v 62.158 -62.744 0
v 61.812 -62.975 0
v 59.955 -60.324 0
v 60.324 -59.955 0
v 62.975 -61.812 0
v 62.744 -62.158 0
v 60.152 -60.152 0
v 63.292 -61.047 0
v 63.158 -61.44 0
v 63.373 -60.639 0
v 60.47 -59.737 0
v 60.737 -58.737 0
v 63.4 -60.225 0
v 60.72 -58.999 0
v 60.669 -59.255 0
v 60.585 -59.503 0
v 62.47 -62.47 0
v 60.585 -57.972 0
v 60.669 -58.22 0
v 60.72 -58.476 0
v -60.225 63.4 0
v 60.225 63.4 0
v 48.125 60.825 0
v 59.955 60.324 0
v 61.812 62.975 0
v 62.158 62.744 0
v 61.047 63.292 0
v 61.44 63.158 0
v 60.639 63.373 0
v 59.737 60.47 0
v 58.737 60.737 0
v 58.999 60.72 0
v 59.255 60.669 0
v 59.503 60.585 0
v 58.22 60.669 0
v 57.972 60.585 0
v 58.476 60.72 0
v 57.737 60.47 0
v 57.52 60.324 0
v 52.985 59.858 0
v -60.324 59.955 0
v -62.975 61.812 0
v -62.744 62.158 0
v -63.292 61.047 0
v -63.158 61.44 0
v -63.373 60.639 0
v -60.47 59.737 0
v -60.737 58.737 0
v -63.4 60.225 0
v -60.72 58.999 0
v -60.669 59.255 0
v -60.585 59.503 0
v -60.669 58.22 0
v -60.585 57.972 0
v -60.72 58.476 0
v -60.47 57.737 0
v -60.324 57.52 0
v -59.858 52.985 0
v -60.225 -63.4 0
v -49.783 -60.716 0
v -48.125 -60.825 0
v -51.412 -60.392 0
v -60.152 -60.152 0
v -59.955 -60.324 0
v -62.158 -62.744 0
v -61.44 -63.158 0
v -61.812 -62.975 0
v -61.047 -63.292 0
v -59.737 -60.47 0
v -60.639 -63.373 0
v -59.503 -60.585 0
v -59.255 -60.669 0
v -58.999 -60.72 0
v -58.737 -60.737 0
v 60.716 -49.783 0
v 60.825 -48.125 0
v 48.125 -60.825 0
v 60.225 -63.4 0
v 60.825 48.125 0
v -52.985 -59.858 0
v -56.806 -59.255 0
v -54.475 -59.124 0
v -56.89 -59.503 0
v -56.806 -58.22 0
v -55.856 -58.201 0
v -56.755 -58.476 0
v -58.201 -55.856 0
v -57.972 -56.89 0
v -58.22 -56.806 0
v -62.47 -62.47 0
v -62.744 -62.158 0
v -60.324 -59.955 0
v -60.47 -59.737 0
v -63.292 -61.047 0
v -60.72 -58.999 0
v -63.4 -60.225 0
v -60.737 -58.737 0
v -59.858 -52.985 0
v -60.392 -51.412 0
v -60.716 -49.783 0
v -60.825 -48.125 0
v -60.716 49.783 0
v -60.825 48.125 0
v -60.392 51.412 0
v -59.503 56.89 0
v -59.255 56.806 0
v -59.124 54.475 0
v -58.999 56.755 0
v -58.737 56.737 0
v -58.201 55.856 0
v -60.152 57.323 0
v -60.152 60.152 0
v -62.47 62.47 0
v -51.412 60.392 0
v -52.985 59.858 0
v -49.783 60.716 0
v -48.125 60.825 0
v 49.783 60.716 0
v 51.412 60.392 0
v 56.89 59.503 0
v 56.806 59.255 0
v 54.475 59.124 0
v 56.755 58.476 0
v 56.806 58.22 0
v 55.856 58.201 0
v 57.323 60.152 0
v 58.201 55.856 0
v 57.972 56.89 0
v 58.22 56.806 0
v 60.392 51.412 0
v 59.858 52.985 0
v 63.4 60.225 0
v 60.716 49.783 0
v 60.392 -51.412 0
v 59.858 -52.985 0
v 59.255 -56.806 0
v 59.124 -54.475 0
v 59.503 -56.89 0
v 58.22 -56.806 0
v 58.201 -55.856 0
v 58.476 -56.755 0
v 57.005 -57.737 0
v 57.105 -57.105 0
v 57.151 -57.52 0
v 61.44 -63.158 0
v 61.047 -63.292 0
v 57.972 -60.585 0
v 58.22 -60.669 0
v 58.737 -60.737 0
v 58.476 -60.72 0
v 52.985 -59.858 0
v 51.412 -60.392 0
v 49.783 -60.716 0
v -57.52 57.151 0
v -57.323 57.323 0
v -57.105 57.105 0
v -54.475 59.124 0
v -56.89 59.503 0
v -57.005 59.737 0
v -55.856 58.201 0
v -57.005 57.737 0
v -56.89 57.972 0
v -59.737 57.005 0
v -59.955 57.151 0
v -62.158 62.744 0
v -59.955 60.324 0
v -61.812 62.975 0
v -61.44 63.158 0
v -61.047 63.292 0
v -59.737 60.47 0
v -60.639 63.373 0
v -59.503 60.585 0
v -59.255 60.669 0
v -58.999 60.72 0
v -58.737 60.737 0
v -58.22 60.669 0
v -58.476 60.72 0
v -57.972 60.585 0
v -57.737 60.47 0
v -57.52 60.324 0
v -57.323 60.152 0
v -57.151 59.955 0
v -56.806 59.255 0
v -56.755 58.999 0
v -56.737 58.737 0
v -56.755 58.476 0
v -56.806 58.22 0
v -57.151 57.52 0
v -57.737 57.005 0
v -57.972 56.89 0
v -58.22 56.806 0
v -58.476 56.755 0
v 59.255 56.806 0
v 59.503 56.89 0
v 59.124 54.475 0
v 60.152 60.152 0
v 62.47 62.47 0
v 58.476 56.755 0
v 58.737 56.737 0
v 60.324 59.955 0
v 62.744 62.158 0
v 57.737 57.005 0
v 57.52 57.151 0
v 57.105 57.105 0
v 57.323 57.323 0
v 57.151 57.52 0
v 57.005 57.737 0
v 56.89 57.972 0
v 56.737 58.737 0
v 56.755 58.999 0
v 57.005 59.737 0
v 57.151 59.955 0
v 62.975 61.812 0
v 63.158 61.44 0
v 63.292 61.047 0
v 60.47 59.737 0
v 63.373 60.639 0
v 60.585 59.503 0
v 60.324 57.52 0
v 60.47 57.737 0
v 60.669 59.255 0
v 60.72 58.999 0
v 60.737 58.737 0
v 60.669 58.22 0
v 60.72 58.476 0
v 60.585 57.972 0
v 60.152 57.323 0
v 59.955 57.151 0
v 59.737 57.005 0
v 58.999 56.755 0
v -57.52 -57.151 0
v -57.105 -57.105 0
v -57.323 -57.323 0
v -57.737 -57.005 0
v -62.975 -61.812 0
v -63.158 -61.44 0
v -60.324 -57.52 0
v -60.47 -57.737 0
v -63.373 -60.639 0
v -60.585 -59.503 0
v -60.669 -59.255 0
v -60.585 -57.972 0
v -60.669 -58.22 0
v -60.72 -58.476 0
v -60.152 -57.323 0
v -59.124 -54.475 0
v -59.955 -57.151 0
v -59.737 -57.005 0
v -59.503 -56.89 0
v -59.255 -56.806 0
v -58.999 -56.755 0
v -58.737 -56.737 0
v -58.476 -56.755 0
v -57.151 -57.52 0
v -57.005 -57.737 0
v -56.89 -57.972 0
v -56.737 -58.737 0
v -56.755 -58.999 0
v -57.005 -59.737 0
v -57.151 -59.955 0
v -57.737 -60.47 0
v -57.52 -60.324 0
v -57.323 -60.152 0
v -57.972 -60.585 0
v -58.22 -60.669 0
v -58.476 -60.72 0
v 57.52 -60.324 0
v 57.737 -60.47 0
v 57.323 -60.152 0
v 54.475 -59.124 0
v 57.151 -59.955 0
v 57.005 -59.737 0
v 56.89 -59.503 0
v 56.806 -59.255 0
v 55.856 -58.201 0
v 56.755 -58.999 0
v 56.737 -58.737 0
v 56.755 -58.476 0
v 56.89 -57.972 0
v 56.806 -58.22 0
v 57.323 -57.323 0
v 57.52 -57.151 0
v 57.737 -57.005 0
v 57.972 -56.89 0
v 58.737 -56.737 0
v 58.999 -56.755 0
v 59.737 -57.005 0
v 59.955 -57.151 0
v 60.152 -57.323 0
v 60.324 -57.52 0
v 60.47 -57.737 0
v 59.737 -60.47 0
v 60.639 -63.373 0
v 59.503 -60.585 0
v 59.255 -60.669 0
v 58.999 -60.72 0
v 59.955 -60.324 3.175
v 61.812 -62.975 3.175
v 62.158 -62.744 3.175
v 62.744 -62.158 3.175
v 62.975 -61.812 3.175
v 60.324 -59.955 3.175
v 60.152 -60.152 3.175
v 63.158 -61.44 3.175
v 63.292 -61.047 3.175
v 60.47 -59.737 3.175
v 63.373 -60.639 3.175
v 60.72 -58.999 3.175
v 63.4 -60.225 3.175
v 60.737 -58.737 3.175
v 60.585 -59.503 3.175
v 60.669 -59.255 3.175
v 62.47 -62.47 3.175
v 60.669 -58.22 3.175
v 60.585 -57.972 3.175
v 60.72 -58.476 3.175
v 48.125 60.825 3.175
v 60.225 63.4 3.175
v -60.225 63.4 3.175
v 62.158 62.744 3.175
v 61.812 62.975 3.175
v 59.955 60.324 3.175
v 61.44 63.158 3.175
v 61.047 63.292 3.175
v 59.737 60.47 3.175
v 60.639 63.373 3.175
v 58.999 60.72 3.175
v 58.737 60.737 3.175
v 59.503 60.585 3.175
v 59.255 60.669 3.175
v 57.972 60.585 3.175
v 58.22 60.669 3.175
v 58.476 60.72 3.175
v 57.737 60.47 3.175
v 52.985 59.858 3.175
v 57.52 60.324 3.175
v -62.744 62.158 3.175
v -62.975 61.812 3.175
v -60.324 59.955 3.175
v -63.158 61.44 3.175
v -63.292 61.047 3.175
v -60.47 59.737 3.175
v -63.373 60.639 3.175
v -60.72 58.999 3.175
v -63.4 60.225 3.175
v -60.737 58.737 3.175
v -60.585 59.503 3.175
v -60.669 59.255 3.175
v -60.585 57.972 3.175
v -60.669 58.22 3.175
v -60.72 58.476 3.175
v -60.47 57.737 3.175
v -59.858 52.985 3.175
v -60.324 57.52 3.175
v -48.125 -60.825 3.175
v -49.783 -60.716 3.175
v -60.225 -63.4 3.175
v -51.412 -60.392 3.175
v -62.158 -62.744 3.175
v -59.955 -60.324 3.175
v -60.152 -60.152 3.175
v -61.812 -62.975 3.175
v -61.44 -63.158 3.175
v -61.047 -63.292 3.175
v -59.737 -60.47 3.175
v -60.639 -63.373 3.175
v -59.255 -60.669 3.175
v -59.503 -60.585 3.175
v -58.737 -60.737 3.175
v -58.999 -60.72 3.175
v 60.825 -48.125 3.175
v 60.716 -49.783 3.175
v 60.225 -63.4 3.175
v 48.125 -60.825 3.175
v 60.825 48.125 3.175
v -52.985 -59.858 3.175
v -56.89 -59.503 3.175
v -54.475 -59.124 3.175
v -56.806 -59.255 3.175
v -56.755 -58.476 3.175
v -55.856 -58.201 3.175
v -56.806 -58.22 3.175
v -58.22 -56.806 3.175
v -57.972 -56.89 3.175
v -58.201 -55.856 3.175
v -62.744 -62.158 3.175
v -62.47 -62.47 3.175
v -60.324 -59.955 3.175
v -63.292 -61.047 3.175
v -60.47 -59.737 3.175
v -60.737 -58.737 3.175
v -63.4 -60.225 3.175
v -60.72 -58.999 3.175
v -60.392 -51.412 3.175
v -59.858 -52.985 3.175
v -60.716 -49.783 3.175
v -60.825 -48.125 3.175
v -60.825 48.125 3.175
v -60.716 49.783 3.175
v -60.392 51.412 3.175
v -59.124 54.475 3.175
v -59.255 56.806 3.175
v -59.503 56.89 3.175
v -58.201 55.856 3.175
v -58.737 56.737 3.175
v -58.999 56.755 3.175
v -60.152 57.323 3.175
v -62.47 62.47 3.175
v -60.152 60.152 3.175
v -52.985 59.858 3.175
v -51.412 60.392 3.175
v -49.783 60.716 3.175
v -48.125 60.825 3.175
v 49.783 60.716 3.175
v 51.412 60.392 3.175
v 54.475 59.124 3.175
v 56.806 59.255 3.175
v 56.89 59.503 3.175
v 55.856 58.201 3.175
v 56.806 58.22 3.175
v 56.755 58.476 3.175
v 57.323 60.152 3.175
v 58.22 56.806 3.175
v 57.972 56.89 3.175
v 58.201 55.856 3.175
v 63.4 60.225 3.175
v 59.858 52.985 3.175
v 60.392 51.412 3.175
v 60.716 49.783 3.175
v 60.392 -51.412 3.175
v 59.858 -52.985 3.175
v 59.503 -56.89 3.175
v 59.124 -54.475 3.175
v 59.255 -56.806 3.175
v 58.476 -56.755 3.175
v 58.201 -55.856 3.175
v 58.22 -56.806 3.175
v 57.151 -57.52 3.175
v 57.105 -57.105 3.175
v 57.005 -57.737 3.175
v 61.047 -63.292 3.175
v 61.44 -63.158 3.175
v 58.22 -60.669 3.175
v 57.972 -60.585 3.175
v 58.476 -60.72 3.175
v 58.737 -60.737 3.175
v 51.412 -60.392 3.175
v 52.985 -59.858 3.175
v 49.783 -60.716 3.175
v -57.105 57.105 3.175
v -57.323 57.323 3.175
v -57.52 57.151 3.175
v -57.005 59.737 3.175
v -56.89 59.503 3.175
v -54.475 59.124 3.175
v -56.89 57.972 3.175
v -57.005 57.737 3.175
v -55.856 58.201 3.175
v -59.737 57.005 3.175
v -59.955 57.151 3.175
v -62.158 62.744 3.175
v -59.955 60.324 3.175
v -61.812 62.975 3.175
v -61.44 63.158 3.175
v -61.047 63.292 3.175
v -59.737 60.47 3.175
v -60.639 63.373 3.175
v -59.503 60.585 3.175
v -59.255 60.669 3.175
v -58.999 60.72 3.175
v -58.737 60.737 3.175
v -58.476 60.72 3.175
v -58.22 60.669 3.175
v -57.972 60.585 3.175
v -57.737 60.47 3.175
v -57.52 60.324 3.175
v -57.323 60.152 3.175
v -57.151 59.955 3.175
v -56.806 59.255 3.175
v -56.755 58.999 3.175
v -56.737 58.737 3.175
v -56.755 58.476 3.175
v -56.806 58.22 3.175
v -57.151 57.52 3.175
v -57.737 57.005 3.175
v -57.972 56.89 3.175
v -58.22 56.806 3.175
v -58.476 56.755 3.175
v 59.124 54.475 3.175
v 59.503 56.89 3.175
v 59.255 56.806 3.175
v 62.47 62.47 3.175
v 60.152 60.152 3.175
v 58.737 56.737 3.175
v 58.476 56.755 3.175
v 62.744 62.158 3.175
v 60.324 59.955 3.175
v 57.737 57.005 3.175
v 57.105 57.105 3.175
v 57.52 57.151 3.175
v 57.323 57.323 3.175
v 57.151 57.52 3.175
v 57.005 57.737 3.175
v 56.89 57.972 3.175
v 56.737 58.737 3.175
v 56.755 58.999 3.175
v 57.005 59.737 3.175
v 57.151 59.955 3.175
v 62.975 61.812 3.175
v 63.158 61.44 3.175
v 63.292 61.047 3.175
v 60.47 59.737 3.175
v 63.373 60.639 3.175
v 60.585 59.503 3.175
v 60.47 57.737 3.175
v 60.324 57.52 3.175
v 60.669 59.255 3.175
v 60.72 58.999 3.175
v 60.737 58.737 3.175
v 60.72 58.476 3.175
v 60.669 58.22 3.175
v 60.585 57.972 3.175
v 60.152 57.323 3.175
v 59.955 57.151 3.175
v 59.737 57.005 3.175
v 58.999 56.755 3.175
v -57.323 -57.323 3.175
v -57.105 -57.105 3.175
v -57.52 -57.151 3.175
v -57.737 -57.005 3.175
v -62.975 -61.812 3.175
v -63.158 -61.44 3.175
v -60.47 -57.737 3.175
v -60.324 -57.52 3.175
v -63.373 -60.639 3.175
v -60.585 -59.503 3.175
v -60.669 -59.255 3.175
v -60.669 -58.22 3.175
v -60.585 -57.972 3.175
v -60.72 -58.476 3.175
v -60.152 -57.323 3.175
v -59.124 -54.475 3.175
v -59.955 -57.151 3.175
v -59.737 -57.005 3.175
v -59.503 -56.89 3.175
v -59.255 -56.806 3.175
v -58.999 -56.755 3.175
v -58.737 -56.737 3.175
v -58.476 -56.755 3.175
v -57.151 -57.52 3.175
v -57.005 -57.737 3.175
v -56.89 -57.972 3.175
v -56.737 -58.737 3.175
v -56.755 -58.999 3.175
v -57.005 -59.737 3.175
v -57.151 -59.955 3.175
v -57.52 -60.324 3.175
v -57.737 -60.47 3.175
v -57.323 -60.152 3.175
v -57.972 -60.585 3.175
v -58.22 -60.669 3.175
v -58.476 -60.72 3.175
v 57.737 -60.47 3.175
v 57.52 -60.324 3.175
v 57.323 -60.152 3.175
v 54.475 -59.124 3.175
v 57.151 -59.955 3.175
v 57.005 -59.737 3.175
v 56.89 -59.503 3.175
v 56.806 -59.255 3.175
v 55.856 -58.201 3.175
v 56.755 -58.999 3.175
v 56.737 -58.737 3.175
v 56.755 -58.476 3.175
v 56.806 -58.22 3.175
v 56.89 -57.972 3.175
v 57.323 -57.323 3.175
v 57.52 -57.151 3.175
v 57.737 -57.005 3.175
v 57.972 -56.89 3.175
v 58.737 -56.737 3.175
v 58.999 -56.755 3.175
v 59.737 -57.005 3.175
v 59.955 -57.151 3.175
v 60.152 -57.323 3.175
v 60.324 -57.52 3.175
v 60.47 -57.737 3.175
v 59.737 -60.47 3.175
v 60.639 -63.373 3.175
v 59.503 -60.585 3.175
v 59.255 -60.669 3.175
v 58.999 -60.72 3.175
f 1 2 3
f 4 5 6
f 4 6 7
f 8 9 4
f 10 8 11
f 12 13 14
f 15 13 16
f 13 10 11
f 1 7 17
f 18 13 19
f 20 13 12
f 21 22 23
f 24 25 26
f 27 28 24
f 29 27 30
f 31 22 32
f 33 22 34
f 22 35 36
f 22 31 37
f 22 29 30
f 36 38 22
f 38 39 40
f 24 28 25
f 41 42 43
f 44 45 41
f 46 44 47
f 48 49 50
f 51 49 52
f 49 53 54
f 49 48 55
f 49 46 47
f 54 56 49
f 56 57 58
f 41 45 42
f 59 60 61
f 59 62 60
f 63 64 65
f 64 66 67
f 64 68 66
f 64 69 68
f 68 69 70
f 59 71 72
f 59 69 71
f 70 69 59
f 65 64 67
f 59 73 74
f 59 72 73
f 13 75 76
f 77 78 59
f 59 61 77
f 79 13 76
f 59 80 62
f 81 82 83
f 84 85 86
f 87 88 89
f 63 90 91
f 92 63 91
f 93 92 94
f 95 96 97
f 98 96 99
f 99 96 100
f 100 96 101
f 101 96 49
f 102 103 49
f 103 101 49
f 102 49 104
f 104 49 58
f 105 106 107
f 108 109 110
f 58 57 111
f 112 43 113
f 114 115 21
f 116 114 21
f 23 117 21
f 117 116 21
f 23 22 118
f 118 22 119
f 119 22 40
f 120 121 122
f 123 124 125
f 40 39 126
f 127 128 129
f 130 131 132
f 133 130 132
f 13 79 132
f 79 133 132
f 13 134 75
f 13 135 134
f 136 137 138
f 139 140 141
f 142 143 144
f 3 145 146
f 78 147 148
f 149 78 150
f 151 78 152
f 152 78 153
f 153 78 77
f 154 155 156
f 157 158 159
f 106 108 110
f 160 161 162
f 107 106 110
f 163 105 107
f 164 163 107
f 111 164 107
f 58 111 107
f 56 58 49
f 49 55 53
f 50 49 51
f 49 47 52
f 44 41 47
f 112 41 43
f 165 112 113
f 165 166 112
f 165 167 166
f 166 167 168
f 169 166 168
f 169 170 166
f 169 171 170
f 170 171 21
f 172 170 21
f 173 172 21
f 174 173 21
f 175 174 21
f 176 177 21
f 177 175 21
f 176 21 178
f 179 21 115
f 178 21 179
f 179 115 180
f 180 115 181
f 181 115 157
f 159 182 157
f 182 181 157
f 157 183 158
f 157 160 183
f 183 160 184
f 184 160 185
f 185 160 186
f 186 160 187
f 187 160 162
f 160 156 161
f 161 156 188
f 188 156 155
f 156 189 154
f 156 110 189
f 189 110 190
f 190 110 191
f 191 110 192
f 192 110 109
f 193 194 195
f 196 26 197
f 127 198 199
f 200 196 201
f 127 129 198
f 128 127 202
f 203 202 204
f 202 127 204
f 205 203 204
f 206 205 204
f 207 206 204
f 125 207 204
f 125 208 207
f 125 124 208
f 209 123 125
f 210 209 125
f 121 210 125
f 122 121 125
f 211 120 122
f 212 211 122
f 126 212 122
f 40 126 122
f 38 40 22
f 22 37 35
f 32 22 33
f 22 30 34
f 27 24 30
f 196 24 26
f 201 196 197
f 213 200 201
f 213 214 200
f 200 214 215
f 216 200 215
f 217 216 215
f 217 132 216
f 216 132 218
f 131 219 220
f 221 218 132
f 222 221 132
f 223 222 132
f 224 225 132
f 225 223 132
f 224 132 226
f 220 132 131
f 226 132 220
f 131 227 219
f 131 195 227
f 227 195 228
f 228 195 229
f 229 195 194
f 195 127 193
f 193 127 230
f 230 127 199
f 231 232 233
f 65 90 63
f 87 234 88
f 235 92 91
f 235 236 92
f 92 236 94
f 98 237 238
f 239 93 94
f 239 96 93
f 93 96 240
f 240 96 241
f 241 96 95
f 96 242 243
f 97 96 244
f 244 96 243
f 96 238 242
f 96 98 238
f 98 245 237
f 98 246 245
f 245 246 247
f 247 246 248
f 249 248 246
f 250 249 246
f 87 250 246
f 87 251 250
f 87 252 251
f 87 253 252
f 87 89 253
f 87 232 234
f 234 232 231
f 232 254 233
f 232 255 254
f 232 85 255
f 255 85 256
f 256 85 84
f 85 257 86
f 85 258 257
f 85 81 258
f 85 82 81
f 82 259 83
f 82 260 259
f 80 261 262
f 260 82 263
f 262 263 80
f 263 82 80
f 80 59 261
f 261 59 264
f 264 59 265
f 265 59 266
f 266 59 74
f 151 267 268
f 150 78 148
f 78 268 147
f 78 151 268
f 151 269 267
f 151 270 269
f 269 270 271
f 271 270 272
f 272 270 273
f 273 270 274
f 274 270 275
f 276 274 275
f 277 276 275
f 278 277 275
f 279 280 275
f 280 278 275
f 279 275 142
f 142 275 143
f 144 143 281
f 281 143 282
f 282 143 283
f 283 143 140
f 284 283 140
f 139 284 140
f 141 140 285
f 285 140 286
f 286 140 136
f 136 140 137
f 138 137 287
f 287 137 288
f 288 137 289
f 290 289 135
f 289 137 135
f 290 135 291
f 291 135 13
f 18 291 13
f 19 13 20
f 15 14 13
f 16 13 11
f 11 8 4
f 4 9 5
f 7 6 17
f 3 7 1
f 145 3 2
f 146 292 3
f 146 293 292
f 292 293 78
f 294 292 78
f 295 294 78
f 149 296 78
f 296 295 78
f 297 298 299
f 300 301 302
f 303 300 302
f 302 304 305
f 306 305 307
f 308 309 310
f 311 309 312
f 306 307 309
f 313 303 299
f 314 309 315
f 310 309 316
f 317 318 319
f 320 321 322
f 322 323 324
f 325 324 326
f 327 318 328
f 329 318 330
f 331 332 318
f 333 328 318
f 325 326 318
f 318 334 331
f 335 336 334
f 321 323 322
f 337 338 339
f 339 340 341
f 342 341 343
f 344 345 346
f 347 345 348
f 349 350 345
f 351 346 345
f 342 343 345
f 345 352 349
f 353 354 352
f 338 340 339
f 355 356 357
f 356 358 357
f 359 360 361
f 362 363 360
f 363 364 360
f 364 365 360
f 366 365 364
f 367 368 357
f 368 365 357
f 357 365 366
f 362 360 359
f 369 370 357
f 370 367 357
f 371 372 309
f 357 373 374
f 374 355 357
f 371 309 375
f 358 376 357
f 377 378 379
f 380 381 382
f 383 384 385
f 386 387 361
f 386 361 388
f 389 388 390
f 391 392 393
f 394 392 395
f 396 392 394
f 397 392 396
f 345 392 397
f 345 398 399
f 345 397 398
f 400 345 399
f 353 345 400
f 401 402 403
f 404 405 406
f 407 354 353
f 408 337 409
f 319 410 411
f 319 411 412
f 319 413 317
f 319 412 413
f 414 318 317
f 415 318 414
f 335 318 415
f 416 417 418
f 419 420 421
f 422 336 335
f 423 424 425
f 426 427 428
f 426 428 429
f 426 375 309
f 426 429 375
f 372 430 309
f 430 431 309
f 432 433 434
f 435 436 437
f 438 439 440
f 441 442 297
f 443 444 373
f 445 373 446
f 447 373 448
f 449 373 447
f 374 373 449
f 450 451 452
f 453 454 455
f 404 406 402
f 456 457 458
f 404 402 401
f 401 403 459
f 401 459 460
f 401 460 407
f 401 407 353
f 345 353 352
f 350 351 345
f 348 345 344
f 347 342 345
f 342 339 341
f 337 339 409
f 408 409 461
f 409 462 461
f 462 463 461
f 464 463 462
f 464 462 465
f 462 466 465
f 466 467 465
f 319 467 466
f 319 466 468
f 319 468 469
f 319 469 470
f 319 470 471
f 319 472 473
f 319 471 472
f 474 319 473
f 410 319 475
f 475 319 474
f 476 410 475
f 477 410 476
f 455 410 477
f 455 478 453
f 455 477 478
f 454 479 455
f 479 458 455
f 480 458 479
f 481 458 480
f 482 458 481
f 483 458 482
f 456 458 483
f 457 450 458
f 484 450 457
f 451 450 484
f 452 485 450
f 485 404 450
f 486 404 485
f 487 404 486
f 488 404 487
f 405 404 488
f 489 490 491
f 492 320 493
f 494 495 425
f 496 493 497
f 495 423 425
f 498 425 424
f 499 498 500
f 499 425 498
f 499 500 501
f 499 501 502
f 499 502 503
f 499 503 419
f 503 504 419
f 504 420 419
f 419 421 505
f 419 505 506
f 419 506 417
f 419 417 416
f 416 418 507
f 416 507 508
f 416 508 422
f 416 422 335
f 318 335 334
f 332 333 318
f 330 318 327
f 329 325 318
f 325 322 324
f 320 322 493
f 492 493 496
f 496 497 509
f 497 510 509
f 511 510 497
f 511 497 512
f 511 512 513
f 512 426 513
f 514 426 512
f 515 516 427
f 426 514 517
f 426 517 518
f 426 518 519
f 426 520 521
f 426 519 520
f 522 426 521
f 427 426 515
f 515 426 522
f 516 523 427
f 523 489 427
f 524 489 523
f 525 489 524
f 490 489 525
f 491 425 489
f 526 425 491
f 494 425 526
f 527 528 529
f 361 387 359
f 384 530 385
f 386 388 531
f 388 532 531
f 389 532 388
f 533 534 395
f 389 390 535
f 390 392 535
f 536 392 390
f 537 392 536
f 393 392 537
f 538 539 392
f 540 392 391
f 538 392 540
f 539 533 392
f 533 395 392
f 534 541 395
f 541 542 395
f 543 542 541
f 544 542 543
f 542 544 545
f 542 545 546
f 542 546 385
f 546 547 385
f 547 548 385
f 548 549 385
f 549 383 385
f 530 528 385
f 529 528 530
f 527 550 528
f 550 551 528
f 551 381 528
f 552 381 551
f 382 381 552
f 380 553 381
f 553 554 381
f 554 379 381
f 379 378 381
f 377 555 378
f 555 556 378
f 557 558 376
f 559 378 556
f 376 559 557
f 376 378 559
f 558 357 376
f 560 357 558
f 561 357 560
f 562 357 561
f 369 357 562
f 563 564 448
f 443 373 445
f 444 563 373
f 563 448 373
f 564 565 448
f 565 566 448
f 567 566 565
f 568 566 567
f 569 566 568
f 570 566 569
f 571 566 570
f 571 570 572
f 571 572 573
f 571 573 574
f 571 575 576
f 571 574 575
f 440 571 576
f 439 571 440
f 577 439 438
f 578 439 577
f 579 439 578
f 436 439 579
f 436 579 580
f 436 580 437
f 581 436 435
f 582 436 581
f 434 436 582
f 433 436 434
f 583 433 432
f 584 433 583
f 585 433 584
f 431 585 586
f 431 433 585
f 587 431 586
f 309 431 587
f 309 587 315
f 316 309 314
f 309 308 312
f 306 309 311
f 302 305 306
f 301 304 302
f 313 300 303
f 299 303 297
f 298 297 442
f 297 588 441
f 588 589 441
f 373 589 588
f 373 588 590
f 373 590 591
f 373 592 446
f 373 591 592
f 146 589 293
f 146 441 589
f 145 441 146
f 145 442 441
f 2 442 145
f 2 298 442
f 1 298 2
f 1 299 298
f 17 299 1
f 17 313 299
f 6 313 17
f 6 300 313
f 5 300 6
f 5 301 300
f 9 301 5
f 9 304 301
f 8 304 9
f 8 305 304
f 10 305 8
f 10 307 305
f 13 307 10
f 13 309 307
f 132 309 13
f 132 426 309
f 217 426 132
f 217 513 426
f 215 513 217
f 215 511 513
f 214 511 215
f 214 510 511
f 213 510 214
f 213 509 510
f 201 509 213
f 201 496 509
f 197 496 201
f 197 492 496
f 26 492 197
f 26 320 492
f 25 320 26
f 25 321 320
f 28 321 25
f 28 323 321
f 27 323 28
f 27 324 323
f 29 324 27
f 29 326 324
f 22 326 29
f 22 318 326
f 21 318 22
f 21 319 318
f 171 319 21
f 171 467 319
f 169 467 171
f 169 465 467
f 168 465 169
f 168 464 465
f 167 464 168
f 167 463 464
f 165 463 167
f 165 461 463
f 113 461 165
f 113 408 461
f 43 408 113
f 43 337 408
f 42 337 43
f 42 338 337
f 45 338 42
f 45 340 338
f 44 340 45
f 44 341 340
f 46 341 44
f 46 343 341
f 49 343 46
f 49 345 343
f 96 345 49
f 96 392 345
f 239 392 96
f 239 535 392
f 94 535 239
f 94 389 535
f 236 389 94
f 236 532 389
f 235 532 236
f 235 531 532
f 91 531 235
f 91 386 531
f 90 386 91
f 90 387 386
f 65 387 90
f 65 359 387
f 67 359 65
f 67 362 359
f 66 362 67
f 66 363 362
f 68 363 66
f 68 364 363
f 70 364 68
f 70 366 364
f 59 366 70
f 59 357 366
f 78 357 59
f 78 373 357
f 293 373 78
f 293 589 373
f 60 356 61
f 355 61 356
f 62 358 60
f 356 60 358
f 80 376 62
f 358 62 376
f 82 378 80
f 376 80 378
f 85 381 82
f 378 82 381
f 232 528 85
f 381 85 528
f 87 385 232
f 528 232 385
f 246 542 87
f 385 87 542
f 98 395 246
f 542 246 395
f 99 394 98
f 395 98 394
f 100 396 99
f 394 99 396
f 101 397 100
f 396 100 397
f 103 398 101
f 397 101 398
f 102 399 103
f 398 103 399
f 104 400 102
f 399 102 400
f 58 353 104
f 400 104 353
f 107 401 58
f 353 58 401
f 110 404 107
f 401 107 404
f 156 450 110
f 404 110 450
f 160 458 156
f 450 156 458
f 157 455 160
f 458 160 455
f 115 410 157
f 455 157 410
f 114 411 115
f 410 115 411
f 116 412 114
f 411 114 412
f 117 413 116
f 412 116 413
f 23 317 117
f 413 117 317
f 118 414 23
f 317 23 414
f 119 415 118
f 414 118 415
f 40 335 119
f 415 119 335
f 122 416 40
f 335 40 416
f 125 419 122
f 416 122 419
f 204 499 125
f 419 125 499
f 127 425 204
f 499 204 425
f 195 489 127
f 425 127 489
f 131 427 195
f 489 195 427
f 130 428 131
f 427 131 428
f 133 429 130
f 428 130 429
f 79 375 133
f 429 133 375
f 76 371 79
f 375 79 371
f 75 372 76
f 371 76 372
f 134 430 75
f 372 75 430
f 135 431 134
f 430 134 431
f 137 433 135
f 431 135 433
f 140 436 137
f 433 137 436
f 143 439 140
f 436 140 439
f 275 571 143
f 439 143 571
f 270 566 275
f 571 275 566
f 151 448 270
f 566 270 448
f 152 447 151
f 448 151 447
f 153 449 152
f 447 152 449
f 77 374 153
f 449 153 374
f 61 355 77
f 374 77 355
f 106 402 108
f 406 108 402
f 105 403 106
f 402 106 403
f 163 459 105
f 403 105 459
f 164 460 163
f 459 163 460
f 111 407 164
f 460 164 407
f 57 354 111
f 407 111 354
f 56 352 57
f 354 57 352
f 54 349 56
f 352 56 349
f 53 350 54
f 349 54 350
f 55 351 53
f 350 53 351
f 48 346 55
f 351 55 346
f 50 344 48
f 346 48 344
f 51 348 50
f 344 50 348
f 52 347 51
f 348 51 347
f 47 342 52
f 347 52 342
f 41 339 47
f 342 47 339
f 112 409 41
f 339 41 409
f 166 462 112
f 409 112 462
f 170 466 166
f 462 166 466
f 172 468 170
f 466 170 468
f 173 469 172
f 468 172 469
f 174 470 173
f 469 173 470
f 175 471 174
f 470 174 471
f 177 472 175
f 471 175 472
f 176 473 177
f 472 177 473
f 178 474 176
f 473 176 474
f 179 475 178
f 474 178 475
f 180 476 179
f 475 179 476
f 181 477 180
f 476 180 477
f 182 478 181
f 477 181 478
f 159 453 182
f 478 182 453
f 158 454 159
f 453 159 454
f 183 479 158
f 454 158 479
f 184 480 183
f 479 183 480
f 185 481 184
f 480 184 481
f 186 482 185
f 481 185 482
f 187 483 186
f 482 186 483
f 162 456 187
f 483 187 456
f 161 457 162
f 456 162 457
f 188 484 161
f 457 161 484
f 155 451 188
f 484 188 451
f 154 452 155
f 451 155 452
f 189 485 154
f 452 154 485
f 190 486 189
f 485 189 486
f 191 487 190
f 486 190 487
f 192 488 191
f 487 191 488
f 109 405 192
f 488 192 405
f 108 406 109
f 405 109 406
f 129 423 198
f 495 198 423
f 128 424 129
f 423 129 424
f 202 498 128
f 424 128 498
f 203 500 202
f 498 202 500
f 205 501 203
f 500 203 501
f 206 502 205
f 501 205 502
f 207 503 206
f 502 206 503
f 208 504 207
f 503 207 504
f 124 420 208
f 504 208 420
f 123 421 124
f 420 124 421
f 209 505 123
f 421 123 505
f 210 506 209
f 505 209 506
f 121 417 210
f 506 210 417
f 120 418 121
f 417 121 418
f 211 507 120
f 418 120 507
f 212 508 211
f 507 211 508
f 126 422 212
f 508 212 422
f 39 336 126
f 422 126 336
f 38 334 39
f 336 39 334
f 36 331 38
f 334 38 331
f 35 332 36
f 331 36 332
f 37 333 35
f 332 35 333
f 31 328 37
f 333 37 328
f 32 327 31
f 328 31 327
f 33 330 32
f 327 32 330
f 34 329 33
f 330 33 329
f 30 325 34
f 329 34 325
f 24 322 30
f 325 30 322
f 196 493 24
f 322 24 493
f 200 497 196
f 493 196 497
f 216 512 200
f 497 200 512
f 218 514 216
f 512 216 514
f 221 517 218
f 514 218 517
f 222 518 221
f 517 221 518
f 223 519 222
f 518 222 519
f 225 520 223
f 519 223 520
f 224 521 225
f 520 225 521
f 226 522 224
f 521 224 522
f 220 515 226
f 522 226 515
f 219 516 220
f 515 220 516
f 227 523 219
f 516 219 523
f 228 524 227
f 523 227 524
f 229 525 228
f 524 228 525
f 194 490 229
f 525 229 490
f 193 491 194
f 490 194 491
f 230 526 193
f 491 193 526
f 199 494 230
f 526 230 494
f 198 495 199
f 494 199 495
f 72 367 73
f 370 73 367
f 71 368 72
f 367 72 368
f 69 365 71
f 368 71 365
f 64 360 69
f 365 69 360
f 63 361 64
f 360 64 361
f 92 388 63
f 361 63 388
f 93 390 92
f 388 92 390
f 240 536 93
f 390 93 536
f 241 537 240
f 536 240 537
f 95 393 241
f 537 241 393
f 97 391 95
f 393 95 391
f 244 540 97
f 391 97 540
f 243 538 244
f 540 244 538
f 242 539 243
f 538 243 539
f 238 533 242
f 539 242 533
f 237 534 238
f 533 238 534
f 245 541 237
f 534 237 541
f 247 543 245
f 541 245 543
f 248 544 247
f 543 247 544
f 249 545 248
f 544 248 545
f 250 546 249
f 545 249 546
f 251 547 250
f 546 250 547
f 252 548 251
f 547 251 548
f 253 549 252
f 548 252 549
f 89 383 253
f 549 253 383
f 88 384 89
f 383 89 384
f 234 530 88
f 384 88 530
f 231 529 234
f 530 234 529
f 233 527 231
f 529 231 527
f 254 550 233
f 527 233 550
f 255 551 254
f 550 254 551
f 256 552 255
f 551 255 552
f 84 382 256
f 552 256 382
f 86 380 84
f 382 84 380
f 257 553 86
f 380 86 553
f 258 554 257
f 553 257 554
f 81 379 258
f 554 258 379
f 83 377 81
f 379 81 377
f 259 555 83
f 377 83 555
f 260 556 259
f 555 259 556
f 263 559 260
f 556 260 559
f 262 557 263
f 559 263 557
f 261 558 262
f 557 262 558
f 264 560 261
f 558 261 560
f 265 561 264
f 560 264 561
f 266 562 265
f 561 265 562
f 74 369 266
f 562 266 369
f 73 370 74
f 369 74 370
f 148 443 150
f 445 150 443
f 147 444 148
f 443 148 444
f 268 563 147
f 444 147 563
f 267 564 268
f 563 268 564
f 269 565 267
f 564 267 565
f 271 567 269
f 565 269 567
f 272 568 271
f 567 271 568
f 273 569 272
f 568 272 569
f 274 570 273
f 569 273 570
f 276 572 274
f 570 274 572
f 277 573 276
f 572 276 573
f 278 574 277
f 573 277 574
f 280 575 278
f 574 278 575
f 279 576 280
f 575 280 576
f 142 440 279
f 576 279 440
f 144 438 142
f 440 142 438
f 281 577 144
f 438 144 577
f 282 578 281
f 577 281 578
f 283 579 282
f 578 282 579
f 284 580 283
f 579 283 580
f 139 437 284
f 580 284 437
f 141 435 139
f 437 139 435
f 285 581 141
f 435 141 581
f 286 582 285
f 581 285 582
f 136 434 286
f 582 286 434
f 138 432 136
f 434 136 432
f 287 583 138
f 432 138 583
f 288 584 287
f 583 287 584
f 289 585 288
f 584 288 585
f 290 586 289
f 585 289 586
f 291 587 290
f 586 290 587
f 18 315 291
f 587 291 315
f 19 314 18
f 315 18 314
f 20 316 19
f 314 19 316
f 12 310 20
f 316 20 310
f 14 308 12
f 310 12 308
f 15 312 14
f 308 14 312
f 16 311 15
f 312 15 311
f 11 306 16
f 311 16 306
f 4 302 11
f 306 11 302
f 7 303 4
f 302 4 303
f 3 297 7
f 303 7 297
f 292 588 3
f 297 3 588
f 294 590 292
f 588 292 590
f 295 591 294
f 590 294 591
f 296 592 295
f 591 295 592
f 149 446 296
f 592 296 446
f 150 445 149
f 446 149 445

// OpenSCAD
// file: ../../lib/TOGArrayLib1.scad
// TOGArrayLib1.4
// 
// Functions for working with arrays.
// 
// v1.1:
// - tal1_reduce assert(is_list(items)) to prevent infinite recursion
//   when given undefined or other non-list values
// v1.1.1:
// - Fix tal1_uniq_remap_v2 to return "list-remap-result" as the
//   first element of the returned list
// v1.2:
// - Add tal1_replace_at function
// v1.3:
// - tal1_is_vec_of, tal1_is_vec_of_num
// v1.4:
// - tal1_assert_for_each, for when you want to assert something
//   about each of a list of items and get nice failure messages

/**
 * Make a list with the contents of list `a`,
 * but starting at offset `off`, replaced by the contents of list `b`.
 * len(result) = max(len(a), off+len(b))
 */
function tal1_replace_at(a, off, b, default_value=undef, default_value_function=undef) =
	assert(is_list(a))
	assert(is_list(b))
	let( _dvf = !is_undef(default_value_function) ? default_value_function : function(i) default_value )
[
	for( i=[0:1:min(off,len(a))-1] ) a[i],
	for( i=[len(a):1:off-1] ) _dvf(i),
	for( i=[off:1:off+len(b)-1] ) b[i-off],
	for( i=[off+len(b):1:len(a)-1] ) a[i],
];

// Simplest case
assert([] == tal1_replace_at([], 0, []));
// Second simplest cases
assert(["foo"] == tal1_replace_at(["foo"], 0, []));
assert(["foo"] == tal1_replace_at([], 0, ["foo"]));
// Replace one item
assert(["foo","quux","baz"] == tal1_replace_at(["foo","bar","baz"], 1, ["quux"]));
// Replace and extend
assert(["foo","quux","tuna","tina"] == tal1_replace_at(["foo","bar","baz"], 1, ["quux", "tuna", "tina"]));
// Add beyond end of `a`
assert(["foo","zzz","quux"] == tal1_replace_at(["foo"], 2, ["quux"], default_value="zzz"));
// Adding 'nothing' should still fill to that point with defaults
assert(["foo","zzz","zzz"] == tal1_replace_at(["foo"], 3, [], default_value="zzz"));


function tal1_reduce(start, items, func, offset=0) =
	assert(is_list(items))
	len(items) == offset ? start :
	tal1_reduce(func(start, items[offset]), items, func, offset+1);

function tal1_consecutive_duplicate_count(items) = tal1_reduce(
	[0, undef],
	items,
	function(z,item) [z[0] + (item == z[1] ? 1 : 0), item]
)[0];

assert(0 == tal1_consecutive_duplicate_count([]));
assert(0 == tal1_consecutive_duplicate_count([50]));
assert(1 == tal1_consecutive_duplicate_count([50,50]));
assert(0 == tal1_consecutive_duplicate_count([50,51,52,53]));
assert(1 == tal1_consecutive_duplicate_count([50,51,52,52]));
assert(3 == tal1_consecutive_duplicate_count([50,50,50,50]));

// Set test_size to arbirarily large values
// to ensure that OpenSCAD can handle heavy recursion
let(test_size=1000) assert(test_size/2 == tal1_consecutive_duplicate_count([for(i=[0:1:test_size-1]) floor(i/2)]));



function tal1_uniq_(items, off0, off1) =
	let(chunklen = off1-off0)
	chunklen == 0 ? [] :
	chunklen == 1 ? [items[off0]] :
	let(half=floor(chunklen/2))
	let(left  = tal1_uniq_(items, off0     , off0+half))
	let(right = tal1_uniq_(items, off0+half, off1     ))
	assert(len(left) > 0)
	assert(len(right) > 0)
	left[len(left)-1] == right[0] ? [each left, for(i=[1:1:len(right)-1]) right[i]] :
	[each left, each right];

/** Given a list of items, returns a new list with identical consecutive items merged */
function tal1_uniq(items) = tal1_uniq_(items, 0, len(items));

assert([] == tal1_uniq([]));
assert([123] == tal1_uniq([123]));
assert([55,0,1,2,3] == tal1_uniq([55,0,1,2,3]));
assert([55,0,1,2] == tal1_uniq([55,0,1,1,2]));
assert([55,0,1] == tal1_uniq([55,55,0,0,0,0,0,0,1,1,1,1]));
assert([55,0] == tal1_uniq([55,0,0,0,0,0,0,0]));



/**
 * Returns [new items, old index -> new index mapping].
 * No-op version.
 */
function tal1_uniq_remap_v1(items) =
	["list-remap-result", items, [for (vi=[0:1:len(items)-1]) vi]];

// [a, a, b, b, c, c]
//
// [a,    ...], []  -> [a],[0]
// [a, a, ...], [0] -> [a],[0,0]

assert([1,2,3] == [1,2,3]);

/**
 * Recursive version that will combine adjacent identical vertexes,
 * but will use the original items.
 */
function tal1_uniq_remap_v2(items, map=[]) =
	let(index = len(map))
	len(items) == index ? ["list-remap-result", items, map] :
	index == 0 ? tal1_uniq_remap_v2(items, [0]) :
	items[index] == items[map[index-1]] ? tal1_uniq_remap_v2(items, [for(vi=map) vi, map[index-1]]) :
	tal1_uniq_remap_v2(items, [for(vi=map) vi, index]);

assert(tal1_uniq_remap_v2([1,1,2,2,3,4]) == ["list-remap-result", [1,1,2,2,3,4], [0,0,2,2,4,5]]);


/**
 * Returns true if `vec` is a list of at least min_len items
 * and component_check(each item, even those beyond min_len) is true.
 */
function tal1_is_vec_of(vec, min_len=0, component_check=function(x) true) =
	assert(is_num(min_len) && min_len >= 0)
	assert(is_function(component_check))
	is_list(vec) && len(vec) >= min_len &&
	tal1_reduce(true, vec, function(prev,item) prev && component_check(item));

function tal1_is_vec_of_num(vec, min_len=0) = tal1_is_vec_of(vec, min_len, function(i) is_num(i));

assert( true == tal1_is_vec_of_num([1,2,3]));
assert( true == tal1_is_vec_of_num([]));
assert( true == tal1_is_vec_of_num([1,2,3], 3));
assert(false == tal1_is_vec_of_num([1,2], 3));
assert(false == tal1_is_vec_of_num([1,2,"spoon"], 3));
// Requirements are ambiguous when
// first min_len items are numbers, but there are non-numeric items afterwards,
// so let's error on the side of saying 'no, it's not a list of numbers';
// i.e. the item check and the min_len are independent.
assert(false == tal1_is_vec_of_num([1,2,3,"artichoke"], 3));


/**
 * Asserts that item_checker(each item in list, index of item)[0] is true.
 * Second element of item_checker return value is assertion message.
 * Returns the original list, in case that's useful to you.
 */
function tal1_assert_for_each(list, item_checker) =
	let( _ignored = [ for(i=[0:1:len(list)-1])
		let(q=item_checker(list[i],i))
		let(passed=is_bool(q) ? q : is_list(q) ? q[0] : assert(false, str(
			"tal1_assert_for_each: item_checker should return Bool|[Bool,String], but returned ",
			q, " for item at index ", i)))
		let(message=is_list(q) ? q[1] : undef)
		assert(passed, message)
		q
	])
	list;

// Callback can return a boolean...
assert([1,2,3] == tal1_assert_for_each([1,2,3], function(v,i) is_num(v)));
// ...or a [boolean, string]
assert([1,2,3] == tal1_assert_for_each([1,2,3], function(v,i) [is_num(v), "element be a num"]));
// file: ../../lib/TOGMod1Constructors.scad
// TOGMod1Constructors-v1.7
// 
// Functions to construct objects understood by TOGMod1
// 
// v1.1:
// - Add togmod1_make_rounded_rect
// v1.2:
// - togmod1_make_rounded_rect can make ovals
// v1.3:
// - togmod1_circle_points, to just get the points of a circle
// - if pos parameter to circle function has a third element,
//   returned vertexes will include it as the z component;
// v1.3.1
// - Some assertions
// v1.4:
// - Refactor togmod1_rounded_rect_points and togmod1_circle_points
//   to use togmod1__make_nd_vector_adder for adapting to whatever
//   `pos` parameter is.
// v1.5:
// - togmod_rounded_rect_points will not simplify completely rounded sides
//   (where length of side is exactly twice the rounding radius)
//   unless simplify_rounded_sides=true
//   - This makes it more useful for polyhedron generation,
//     where radius varies, but number of points must remain constant.
// v1.6:
// - togmod1_make_rect makes a simple rectangle
// - togmod1_make_rounded_rect will defer to togmod1_make_rect when r=0
// v1.7:
// - togmod1_make_circle will return empty shape (["union"]) when d=0

use <./TOGArrayLib1.scad>

function togmod1__make_nd_vector_adder(origin=[0,0]) =
	let(origin_is_zero = tal1_reduce(true, origin, function(prev,item) prev && item == 0))
	origin_is_zero ? (function(vec) len(vec) >= len(origin) ? vec : tal1_replace_at(origin, 0, vec)) :
	function(vec) [
		for(i=[0:1:max(len(origin),len(vec))-1]) (len(vec) > i ? vec[i] : 0) + (len(origin) > i ? origin[i] : 0),
	];

assert([1,2,3] == togmod1__make_nd_vector_adder()([1,2,3]));
echo(togmod1__make_nd_vector_adder([0,0,3])([1,2]));
assert([1,2,3] == togmod1__make_nd_vector_adder([0,0,3])([1,2]));


function togmod1_make_cuboid(size) =
	assert(is_list(size))
	assert(len(size) >= 3)
	assert(is_num(size[0]))
	assert(is_num(size[1]))
	assert(is_num(size[2]))
	["polyhedron-vf", [
		[-size[0]/2, -size[1]/2, -size[2]/2],
		[+size[0]/2, -size[1]/2, -size[2]/2],
		[-size[0]/2, +size[1]/2, -size[2]/2],
		[+size[0]/2, +size[1]/2, -size[2]/2],
		[-size[0]/2, -size[1]/2, +size[2]/2],
		[+size[0]/2, -size[1]/2, +size[2]/2],
		[-size[0]/2, +size[1]/2, +size[2]/2],
		[+size[0]/2, +size[1]/2, +size[2]/2]
	], [
		[0,1,3,2],[0,4,5,1],[4,6,7,5],[3,7,6,2],[1,5,7,3],[6,4,0,2]
	]];

function togmod1_make_polygon(verts) =
	["polygon-vp", verts, [[for( i=[0:1:len(verts)-1] ) i%len(verts)]]];

function togmod1_rounded_rect_points(size, r, pos=[0,0], simplify_rounded_sides=false) =
	assert(is_list(size))
	assert(len(size) >= 2)
	let(radii = is_list(r) ? r : is_num(r) ? [r,r] : assert(false, "rounded_rect r(adius) should be list<num> or num"))
	let(rx = radii[0])
	let(ry = radii[1])
	assert(is_num(rx))
	assert(is_num(ry))
	assert(size[0] >= 2*rx, str("size[0] must be >= 2*r[0]; size[0] = ",size[0],", 2*r[0] = ",2*rx))
	assert(size[1] >= 2*ry, str("size[1] must be >= 2*r[1]; size[1] = ",size[1],", 2*r[1] = ",2*ry))
	let(quarterfn=max($fn/4, 1))
	let(qfnx = simplify_rounded_sides && size[0] == 2*rx ? quarterfn-1 : quarterfn)
	let(qfny = simplify_rounded_sides && size[1] == 2*ry ? quarterfn-1 : quarterfn)
	let(finalizepos = togmod1__make_nd_vector_adder(pos))
[
	for(a=[0 : 1 : qfnx]) let(ang=      a*90/quarterfn) finalizepos([ size[0]/2-rx + rx*cos(ang),  size[1]/2-ry + ry*sin(ang)]),
	for(a=[0 : 1 : qfny]) let(ang= 90 + a*90/quarterfn) finalizepos([-size[0]/2+rx + rx*cos(ang),  size[1]/2-ry + ry*sin(ang)]),
	for(a=[0 : 1 : qfnx]) let(ang=180 + a*90/quarterfn) finalizepos([-size[0]/2+rx + rx*cos(ang), -size[1]/2+ry + ry*sin(ang)]),
	for(a=[0 : 1 : qfny]) let(ang=270 + a*90/quarterfn) finalizepos([ size[0]/2-rx + rx*cos(ang), -size[1]/2+ry + ry*sin(ang)]),
];

function togmod1_make_rect(size) =
	togmod1_make_polygon([
		[-size[0]/2, -size[1]/2],
		[+size[0]/2, -size[1]/2],
		[+size[0]/2, +size[1]/2],
		[-size[0]/2, +size[1]/2],
	]);

function togmod1_make_rounded_rect(size, r) =
	r == 0 ? togmod1_make_rect(size) :
	togmod1_make_polygon(togmod1_rounded_rect_points(size,r,simplify_rounded_sides=true));

function togmod1_circle_points(r, pos=[0,0], d=undef) =
	assert( !is_undef(r) || !is_undef(d) )
	assert(!is_undef(pos[0]))
	assert(!is_undef(pos[1]))
	let(finalizepos = togmod1__make_nd_vector_adder(pos))
	let(r_ = !is_undef(r) ? r : d/2)
	let(fn = max($fn, 6))
	[for(i=[0 : 1 : fn-1]) finalizepos([r_*cos(i*360/fn), r_*sin(i*360/fn)])];

function togmod1_make_circle(r, pos=[0,0], d=undef) =
	r == 0 || d == 0 ? ["union"] :
	togmod1_make_polygon(togmod1_circle_points(r=r, pos=pos, d=d));

function togmod1_make_cylinder(d, zrange=[0,1], r=undef, pos=[0,0]) =
	assert( !is_undef(r) || !is_undef(d) )
	let( r_ = !is_undef(r) ? r : d/2 )
	// TODO: Make polyhedron directly
	["linear-extrude-zs", zrange, togmod1_make_circle(r=r_, pos=pos)];

function togmod1__is_range1d(range) = is_list(range) && len(range) == 2 && is_num(range[0]) && is_num(range[1]);

function togmod1_linear_extrude_z(range, shape) =
	assert(togmod1__is_range1d(range))
	["linear-extrude-zs", range, shape];
function togmod1_linear_extrude_x(range, shape) =
	assert(togmod1__is_range1d(range))
	["rotate", [90, 0, 90], togmod1_linear_extrude_z(range, shape)];
function togmod1_linear_extrude_y(range, shape) =
	assert(togmod1__is_range1d(range))
	["rotate", [90, 0, 180], togmod1_linear_extrude_z(range, shape)];
// file: ../../lib/TOGMod1.scad
// TOGMod1
// OpenSCAD library for representing shapes
// 
// See also: Functional OpenSCAD (https://github.com/thehans/FunctionalOpenSCAD)

module togmod1_domodule(mod) {
	assert(is_list(mod));
	assert(len(mod) > 0);
	if( mod[0] == "polygon-vp" ) {
		// ["polygon-vp", vertexes, paths]
		polygon(points=mod[1], paths=mod[2]);
	} else if( mod[0] == "polyhedron-vf" ) {
		polyhedron(mod[1], faces=mod[2]);
	} else if( mod[0] == "scale" ) {
		assert(len(mod) == 3);
		scale(mod[1]) togmod1_domodule(mod[2]);
	} else if( mod[0] == "translate" ) {
		assert(len(mod) == 3);
		assert(is_list(mod[1]));
		for(c=mod[1]) assert(is_num(c), "translate component should be numeric");
		translate(mod[1]) togmod1_domodule(mod[2]);
	} else if( mod[0] == "rotate" ) {
		assert(len(mod) == 3);
		rotate(mod[1]) togmod1_domodule(mod[2]);
	} else if( mod[0] == "intersection" ) {
		intersection_for( i=[1:1:len(mod)-1] ) togmod1_domodule(mod[i]);
	} else if( mod[0] == "difference" ) {
		difference() {
			togmod1_domodule(mod[1]);
			for( i=[2:1:len(mod)-1] ) togmod1_domodule(mod[i]);
		}
	} else if( mod[0] == "union" ) {
		for( i=[1:1:len(mod)-1] ) togmod1_domodule(mod[i]);
	} else if( mod[0] == "hull" ) {
		hull() for( i=[1:1:len(mod)-1] ) togmod1_domodule(mod[i]);
	} else if( mod[0] == "offset-rs" ) {
		assert(len(mod) == 3);
		assert(is_num(mod[1]));
		assert(is_list(mod[2]));
		offset(mod[1]) togmod1_domodule(mod[2]);
	} else if( mod[0] == "linear-extrude-zs" ) {
		// ["linear-extrude-zs", [z0,z1], 2d_shape] // centered
		// ["linear-extrude-zs", height, 2d_shape]
		let( zrange = is_list(mod[1]) ? mod[1] : [-mod[1]/2, mod[1]/2] ) {
			translate([0,0,zrange[0]]) linear_extrude(zrange[1]-zrange[0]) togmod1_domodule(mod[2]);
		}
	} else if( mod[0] == "render" ) {
		render() togmod1_domodule(mod[1]);
	} else if( mod[0] == "minkowski" ) {
		minkowski() {
			togmod1_domodule(mod[1]);
			togmod1_domodule(mod[2]);
		}
	} else if( mod[0] == "x-debug" ) {
		# togmod1_domodule(mod[1]);
	} else if( mod[0] == "x-color" ) {
		color(mod[1]) togmod1_domodule(mod[2]);
	} else {
		assert(false, str("Unrecognized shape: ", mod[0]));
	}
}
// main file
// OumaxBottomSizeTester0.1

use <../../lib/TOGMod1.scad>
use <../../lib/TOGMod1Constructors.scad>

outer_margin = 0.1;
inner_margin = 0.5;
$fn = 48;

module oumaxholder0__end_params() { }

inch = 25.4;

base_size_tester = togmod1_linear_extrude_z([0, 3.175], ["difference",
	togmod1_make_rounded_rect([5*inch - outer_margin*2, 5*inch - outer_margin*2], r=3.175),
	
	togmod1_make_rounded_rect([4.75*inch + inner_margin*2, 4.75*inch + inner_margin*2], r=12.7),
	for( ym=[-1,1] ) for( xm=[-1,1] ) ["translate", [xm * (2.5-3/16)*inch, ym * (2.5-3/16)*inch], togmod1_make_circle(d=4)],
]);

togmod1_domodule(base_size_tester);
